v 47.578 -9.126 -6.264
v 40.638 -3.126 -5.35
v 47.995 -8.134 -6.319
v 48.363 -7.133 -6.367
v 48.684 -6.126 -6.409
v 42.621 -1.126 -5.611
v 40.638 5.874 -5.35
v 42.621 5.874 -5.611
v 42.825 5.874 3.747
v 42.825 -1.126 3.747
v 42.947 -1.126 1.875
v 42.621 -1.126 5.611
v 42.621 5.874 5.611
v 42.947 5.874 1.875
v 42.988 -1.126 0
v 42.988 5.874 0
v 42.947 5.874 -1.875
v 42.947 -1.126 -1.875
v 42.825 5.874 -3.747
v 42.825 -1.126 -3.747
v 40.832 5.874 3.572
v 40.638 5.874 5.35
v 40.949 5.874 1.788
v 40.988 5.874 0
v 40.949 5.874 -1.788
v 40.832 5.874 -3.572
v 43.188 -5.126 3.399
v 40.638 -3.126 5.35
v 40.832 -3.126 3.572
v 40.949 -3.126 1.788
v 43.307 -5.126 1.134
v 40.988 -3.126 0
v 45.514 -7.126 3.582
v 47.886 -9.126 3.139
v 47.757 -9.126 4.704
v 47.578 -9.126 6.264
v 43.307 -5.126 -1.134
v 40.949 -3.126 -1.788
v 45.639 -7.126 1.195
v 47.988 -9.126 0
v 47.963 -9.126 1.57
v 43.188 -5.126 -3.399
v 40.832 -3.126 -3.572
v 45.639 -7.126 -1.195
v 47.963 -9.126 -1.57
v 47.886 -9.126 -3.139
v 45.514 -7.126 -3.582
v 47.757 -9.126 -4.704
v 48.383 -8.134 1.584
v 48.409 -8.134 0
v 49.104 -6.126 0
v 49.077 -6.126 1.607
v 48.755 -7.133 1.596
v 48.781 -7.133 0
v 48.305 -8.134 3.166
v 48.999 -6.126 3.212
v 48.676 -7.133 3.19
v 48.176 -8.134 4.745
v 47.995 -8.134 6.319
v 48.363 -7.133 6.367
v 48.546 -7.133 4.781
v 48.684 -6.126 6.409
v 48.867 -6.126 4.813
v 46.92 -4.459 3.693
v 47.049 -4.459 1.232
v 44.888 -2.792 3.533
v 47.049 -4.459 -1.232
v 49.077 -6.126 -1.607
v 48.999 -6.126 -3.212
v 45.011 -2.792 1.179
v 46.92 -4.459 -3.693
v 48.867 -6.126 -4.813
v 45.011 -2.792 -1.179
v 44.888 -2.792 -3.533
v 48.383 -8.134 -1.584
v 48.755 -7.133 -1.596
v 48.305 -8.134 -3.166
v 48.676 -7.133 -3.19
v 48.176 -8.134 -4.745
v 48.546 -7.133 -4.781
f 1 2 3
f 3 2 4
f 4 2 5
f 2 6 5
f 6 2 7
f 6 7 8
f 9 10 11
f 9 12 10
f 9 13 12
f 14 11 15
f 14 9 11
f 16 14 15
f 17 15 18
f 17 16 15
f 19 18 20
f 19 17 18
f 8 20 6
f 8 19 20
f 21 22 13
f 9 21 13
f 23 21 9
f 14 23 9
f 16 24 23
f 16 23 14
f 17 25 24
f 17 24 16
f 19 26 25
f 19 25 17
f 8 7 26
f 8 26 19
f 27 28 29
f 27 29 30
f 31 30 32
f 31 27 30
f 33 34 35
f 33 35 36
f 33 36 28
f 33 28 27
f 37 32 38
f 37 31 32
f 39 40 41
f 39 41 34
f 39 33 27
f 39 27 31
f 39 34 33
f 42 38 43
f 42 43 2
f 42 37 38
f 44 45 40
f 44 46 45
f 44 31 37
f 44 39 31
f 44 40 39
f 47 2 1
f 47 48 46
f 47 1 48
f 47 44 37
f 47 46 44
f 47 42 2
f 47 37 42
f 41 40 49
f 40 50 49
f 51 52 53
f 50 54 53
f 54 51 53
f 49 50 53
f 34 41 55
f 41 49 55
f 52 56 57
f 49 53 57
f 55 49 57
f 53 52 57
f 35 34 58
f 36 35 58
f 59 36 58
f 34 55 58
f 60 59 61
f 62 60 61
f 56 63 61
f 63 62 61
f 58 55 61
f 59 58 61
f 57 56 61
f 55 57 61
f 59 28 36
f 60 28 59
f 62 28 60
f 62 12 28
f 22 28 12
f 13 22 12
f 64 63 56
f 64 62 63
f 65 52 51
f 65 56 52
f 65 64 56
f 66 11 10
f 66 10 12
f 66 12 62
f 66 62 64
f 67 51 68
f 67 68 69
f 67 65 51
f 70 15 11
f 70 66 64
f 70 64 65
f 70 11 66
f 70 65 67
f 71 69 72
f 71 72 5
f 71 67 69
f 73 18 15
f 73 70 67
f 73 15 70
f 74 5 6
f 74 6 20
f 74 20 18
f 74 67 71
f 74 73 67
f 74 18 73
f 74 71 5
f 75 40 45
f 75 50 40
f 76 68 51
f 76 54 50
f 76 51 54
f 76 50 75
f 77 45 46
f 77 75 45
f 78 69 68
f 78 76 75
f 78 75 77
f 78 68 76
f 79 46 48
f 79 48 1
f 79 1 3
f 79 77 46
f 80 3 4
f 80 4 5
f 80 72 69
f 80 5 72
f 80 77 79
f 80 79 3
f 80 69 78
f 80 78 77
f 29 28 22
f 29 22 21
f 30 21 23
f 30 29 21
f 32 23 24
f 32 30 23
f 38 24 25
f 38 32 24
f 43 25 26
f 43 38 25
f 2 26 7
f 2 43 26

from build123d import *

# Parameters (mm, degrees)
F1_ANGLE = 15


with BuildPart() as f1:
    # F0 (on Top) → F1 (revolve, symmetric)
    with BuildSketch(Plane.XY) as f1_sk:
        with BuildLine():
            Line((40.988395, -3.125822), (47.988395, -9.125822))
            add(Edge.make_bspline(
                [(47.988395, -9.125822), (48.655789, -7.643054), (49.103786, -6.125822)],
                knots=[5.998563, 5.998563, 5.998563, 6.093564, 6.093564, 6.093564], degree=2, weights=[1, 0.998872, 1]))
            Line((49.103786, -6.125822), (42.988395, -1.125822))
            Line((42.988395, -1.125822), (42.988395, 5.874178))
            Line((42.988395, 5.874178), (40.988395, 5.874178))
            Line((40.988395, 5.874178), (40.988395, -3.125822))
        make_face()
    revolve(axis=Axis((0, 4.998505, 0), (0, -1, 0)), revolution_arc=F1_ANGLE / 2)
    revolve(f1_sk.sketch, axis=Axis((0, 4.998505, 0), (0, 1, 0)), revolution_arc=F1_ANGLE / 2)


solid = f1.part
